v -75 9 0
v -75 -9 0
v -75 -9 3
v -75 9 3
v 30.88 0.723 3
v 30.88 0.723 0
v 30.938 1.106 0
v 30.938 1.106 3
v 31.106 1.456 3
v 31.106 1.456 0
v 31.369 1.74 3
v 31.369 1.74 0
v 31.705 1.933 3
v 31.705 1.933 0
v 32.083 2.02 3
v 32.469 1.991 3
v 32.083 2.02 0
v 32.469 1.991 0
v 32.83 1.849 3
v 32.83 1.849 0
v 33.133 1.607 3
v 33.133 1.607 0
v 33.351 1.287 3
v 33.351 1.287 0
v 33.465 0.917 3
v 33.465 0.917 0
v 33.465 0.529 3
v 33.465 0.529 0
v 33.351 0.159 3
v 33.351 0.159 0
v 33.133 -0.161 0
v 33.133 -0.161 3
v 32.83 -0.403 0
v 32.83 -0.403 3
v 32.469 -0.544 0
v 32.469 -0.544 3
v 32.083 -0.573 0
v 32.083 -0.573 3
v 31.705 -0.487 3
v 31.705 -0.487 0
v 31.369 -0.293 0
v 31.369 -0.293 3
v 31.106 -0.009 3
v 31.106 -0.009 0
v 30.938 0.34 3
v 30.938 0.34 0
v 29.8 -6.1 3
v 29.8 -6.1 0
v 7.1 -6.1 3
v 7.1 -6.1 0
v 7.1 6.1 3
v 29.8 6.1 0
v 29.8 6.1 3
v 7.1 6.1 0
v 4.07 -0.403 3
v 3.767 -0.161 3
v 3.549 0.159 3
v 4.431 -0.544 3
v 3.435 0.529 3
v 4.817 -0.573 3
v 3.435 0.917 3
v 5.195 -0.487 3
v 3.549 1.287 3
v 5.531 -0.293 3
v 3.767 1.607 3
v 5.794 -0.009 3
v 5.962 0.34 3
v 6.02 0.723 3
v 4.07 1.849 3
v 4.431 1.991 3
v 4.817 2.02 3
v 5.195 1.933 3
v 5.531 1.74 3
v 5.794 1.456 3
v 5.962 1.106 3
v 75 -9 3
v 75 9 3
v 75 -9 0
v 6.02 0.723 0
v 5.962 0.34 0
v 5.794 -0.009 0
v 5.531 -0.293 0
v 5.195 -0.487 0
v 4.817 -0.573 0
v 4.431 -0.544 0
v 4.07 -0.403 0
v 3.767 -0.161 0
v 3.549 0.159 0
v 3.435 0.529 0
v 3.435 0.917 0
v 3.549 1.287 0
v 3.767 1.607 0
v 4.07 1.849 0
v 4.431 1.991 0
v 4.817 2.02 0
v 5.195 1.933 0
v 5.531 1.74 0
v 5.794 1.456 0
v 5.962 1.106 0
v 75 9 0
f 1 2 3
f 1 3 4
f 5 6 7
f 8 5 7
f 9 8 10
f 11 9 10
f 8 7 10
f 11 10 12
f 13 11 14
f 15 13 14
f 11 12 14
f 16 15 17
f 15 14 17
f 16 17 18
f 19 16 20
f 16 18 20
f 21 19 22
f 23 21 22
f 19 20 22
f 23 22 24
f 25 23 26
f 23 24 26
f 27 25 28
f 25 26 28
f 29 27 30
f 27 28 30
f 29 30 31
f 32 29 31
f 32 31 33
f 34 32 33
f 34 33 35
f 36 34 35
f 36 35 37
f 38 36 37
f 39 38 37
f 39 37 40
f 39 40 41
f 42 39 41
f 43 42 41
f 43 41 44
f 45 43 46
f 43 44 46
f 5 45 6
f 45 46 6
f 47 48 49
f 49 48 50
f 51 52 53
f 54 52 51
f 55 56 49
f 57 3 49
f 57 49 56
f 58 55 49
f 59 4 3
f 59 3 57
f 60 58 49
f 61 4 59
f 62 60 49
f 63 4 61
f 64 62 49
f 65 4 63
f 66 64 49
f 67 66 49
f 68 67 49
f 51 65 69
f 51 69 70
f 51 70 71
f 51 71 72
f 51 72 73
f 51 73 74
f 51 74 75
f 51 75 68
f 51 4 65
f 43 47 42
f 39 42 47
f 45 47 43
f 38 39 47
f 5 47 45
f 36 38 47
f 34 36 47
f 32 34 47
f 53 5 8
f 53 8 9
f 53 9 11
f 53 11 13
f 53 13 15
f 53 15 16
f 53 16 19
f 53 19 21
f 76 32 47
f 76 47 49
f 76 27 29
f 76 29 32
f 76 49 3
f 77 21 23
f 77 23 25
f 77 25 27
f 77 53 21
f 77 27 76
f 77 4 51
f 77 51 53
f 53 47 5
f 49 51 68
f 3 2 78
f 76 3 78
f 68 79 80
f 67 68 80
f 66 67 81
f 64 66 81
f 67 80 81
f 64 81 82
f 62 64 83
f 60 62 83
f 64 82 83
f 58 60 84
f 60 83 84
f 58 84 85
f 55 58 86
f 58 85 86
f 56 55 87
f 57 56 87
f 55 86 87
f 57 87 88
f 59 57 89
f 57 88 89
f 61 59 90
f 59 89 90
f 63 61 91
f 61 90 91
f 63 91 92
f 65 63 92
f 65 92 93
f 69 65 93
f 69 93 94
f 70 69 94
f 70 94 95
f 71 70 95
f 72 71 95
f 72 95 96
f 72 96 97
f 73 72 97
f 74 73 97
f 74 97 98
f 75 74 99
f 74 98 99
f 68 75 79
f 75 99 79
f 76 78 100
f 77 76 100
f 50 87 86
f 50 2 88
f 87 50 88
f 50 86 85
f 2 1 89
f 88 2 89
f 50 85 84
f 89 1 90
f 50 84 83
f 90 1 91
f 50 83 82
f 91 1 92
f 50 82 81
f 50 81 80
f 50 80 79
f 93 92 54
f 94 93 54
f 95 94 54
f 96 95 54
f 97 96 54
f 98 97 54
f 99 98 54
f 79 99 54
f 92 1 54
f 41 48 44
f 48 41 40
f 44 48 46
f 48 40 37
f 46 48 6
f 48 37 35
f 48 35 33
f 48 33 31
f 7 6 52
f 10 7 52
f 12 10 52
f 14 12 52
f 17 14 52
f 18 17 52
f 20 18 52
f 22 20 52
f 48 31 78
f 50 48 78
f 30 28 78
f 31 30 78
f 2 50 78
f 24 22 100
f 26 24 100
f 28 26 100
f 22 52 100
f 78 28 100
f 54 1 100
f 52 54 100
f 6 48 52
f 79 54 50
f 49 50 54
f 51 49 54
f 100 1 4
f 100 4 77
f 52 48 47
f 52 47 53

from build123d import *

# Parameters (mm, degrees)
SKETCH1_W           = 150
SKETCH1_H           = 18
BOSS_EXTRUDE1_DEPTH = 3
SKETCH2_W           = 22.7
SKETCH2_H           = 12.2
CUT_EXTRUDE1_DEPTH  = 3
SKETCH3_R           = 1.2
BOSS_EXTRUDE2_DEPTH = 3
SKETCH4_R           = 1.3
CUT_EXTRUDE2_DEPTH  = 3


with BuildPart() as part:
    # Sketch1 → Boss-Extrude1 (new body)
    with BuildSketch(Plane.XY):
        Rectangle(SKETCH1_W, SKETCH1_H)
    extrude(amount=BOSS_EXTRUDE1_DEPTH)

    # Sketch2 → Cut-Extrude1 (cut)
    with BuildSketch(Plane(origin=(0, 0, 0), x_dir=(-1, 0, 0), z_dir=(0, 0, -1))):
        with Locations((-18.45, 0)):
            Rectangle(SKETCH2_W, SKETCH2_H)
    extrude(amount=-CUT_EXTRUDE1_DEPTH, mode=Mode.SUBTRACT)

    # Sketch3 → Boss-Extrude2 (add)
    with BuildSketch(Plane.XY.offset(3)):
        with Locations((32.175, 0.1)):
            Circle(SKETCH3_R)
    extrude(amount=-BOSS_EXTRUDE2_DEPTH)

    # Sketch4 → Cut-Extrude2 (cut)
    with BuildSketch(Plane(origin=(0, 0, 0), x_dir=(-1, 0, 0), z_dir=(0, 0, -1))):
        with Locations((-32.18, 0.723190071)):
            Circle(SKETCH4_R)
        with Locations(Location((-4.72, 0.723190071, 0), (0, 0, 180))):
            Circle(SKETCH4_R)
    extrude(amount=-CUT_EXTRUDE2_DEPTH, mode=Mode.SUBTRACT)


solid = part.part
